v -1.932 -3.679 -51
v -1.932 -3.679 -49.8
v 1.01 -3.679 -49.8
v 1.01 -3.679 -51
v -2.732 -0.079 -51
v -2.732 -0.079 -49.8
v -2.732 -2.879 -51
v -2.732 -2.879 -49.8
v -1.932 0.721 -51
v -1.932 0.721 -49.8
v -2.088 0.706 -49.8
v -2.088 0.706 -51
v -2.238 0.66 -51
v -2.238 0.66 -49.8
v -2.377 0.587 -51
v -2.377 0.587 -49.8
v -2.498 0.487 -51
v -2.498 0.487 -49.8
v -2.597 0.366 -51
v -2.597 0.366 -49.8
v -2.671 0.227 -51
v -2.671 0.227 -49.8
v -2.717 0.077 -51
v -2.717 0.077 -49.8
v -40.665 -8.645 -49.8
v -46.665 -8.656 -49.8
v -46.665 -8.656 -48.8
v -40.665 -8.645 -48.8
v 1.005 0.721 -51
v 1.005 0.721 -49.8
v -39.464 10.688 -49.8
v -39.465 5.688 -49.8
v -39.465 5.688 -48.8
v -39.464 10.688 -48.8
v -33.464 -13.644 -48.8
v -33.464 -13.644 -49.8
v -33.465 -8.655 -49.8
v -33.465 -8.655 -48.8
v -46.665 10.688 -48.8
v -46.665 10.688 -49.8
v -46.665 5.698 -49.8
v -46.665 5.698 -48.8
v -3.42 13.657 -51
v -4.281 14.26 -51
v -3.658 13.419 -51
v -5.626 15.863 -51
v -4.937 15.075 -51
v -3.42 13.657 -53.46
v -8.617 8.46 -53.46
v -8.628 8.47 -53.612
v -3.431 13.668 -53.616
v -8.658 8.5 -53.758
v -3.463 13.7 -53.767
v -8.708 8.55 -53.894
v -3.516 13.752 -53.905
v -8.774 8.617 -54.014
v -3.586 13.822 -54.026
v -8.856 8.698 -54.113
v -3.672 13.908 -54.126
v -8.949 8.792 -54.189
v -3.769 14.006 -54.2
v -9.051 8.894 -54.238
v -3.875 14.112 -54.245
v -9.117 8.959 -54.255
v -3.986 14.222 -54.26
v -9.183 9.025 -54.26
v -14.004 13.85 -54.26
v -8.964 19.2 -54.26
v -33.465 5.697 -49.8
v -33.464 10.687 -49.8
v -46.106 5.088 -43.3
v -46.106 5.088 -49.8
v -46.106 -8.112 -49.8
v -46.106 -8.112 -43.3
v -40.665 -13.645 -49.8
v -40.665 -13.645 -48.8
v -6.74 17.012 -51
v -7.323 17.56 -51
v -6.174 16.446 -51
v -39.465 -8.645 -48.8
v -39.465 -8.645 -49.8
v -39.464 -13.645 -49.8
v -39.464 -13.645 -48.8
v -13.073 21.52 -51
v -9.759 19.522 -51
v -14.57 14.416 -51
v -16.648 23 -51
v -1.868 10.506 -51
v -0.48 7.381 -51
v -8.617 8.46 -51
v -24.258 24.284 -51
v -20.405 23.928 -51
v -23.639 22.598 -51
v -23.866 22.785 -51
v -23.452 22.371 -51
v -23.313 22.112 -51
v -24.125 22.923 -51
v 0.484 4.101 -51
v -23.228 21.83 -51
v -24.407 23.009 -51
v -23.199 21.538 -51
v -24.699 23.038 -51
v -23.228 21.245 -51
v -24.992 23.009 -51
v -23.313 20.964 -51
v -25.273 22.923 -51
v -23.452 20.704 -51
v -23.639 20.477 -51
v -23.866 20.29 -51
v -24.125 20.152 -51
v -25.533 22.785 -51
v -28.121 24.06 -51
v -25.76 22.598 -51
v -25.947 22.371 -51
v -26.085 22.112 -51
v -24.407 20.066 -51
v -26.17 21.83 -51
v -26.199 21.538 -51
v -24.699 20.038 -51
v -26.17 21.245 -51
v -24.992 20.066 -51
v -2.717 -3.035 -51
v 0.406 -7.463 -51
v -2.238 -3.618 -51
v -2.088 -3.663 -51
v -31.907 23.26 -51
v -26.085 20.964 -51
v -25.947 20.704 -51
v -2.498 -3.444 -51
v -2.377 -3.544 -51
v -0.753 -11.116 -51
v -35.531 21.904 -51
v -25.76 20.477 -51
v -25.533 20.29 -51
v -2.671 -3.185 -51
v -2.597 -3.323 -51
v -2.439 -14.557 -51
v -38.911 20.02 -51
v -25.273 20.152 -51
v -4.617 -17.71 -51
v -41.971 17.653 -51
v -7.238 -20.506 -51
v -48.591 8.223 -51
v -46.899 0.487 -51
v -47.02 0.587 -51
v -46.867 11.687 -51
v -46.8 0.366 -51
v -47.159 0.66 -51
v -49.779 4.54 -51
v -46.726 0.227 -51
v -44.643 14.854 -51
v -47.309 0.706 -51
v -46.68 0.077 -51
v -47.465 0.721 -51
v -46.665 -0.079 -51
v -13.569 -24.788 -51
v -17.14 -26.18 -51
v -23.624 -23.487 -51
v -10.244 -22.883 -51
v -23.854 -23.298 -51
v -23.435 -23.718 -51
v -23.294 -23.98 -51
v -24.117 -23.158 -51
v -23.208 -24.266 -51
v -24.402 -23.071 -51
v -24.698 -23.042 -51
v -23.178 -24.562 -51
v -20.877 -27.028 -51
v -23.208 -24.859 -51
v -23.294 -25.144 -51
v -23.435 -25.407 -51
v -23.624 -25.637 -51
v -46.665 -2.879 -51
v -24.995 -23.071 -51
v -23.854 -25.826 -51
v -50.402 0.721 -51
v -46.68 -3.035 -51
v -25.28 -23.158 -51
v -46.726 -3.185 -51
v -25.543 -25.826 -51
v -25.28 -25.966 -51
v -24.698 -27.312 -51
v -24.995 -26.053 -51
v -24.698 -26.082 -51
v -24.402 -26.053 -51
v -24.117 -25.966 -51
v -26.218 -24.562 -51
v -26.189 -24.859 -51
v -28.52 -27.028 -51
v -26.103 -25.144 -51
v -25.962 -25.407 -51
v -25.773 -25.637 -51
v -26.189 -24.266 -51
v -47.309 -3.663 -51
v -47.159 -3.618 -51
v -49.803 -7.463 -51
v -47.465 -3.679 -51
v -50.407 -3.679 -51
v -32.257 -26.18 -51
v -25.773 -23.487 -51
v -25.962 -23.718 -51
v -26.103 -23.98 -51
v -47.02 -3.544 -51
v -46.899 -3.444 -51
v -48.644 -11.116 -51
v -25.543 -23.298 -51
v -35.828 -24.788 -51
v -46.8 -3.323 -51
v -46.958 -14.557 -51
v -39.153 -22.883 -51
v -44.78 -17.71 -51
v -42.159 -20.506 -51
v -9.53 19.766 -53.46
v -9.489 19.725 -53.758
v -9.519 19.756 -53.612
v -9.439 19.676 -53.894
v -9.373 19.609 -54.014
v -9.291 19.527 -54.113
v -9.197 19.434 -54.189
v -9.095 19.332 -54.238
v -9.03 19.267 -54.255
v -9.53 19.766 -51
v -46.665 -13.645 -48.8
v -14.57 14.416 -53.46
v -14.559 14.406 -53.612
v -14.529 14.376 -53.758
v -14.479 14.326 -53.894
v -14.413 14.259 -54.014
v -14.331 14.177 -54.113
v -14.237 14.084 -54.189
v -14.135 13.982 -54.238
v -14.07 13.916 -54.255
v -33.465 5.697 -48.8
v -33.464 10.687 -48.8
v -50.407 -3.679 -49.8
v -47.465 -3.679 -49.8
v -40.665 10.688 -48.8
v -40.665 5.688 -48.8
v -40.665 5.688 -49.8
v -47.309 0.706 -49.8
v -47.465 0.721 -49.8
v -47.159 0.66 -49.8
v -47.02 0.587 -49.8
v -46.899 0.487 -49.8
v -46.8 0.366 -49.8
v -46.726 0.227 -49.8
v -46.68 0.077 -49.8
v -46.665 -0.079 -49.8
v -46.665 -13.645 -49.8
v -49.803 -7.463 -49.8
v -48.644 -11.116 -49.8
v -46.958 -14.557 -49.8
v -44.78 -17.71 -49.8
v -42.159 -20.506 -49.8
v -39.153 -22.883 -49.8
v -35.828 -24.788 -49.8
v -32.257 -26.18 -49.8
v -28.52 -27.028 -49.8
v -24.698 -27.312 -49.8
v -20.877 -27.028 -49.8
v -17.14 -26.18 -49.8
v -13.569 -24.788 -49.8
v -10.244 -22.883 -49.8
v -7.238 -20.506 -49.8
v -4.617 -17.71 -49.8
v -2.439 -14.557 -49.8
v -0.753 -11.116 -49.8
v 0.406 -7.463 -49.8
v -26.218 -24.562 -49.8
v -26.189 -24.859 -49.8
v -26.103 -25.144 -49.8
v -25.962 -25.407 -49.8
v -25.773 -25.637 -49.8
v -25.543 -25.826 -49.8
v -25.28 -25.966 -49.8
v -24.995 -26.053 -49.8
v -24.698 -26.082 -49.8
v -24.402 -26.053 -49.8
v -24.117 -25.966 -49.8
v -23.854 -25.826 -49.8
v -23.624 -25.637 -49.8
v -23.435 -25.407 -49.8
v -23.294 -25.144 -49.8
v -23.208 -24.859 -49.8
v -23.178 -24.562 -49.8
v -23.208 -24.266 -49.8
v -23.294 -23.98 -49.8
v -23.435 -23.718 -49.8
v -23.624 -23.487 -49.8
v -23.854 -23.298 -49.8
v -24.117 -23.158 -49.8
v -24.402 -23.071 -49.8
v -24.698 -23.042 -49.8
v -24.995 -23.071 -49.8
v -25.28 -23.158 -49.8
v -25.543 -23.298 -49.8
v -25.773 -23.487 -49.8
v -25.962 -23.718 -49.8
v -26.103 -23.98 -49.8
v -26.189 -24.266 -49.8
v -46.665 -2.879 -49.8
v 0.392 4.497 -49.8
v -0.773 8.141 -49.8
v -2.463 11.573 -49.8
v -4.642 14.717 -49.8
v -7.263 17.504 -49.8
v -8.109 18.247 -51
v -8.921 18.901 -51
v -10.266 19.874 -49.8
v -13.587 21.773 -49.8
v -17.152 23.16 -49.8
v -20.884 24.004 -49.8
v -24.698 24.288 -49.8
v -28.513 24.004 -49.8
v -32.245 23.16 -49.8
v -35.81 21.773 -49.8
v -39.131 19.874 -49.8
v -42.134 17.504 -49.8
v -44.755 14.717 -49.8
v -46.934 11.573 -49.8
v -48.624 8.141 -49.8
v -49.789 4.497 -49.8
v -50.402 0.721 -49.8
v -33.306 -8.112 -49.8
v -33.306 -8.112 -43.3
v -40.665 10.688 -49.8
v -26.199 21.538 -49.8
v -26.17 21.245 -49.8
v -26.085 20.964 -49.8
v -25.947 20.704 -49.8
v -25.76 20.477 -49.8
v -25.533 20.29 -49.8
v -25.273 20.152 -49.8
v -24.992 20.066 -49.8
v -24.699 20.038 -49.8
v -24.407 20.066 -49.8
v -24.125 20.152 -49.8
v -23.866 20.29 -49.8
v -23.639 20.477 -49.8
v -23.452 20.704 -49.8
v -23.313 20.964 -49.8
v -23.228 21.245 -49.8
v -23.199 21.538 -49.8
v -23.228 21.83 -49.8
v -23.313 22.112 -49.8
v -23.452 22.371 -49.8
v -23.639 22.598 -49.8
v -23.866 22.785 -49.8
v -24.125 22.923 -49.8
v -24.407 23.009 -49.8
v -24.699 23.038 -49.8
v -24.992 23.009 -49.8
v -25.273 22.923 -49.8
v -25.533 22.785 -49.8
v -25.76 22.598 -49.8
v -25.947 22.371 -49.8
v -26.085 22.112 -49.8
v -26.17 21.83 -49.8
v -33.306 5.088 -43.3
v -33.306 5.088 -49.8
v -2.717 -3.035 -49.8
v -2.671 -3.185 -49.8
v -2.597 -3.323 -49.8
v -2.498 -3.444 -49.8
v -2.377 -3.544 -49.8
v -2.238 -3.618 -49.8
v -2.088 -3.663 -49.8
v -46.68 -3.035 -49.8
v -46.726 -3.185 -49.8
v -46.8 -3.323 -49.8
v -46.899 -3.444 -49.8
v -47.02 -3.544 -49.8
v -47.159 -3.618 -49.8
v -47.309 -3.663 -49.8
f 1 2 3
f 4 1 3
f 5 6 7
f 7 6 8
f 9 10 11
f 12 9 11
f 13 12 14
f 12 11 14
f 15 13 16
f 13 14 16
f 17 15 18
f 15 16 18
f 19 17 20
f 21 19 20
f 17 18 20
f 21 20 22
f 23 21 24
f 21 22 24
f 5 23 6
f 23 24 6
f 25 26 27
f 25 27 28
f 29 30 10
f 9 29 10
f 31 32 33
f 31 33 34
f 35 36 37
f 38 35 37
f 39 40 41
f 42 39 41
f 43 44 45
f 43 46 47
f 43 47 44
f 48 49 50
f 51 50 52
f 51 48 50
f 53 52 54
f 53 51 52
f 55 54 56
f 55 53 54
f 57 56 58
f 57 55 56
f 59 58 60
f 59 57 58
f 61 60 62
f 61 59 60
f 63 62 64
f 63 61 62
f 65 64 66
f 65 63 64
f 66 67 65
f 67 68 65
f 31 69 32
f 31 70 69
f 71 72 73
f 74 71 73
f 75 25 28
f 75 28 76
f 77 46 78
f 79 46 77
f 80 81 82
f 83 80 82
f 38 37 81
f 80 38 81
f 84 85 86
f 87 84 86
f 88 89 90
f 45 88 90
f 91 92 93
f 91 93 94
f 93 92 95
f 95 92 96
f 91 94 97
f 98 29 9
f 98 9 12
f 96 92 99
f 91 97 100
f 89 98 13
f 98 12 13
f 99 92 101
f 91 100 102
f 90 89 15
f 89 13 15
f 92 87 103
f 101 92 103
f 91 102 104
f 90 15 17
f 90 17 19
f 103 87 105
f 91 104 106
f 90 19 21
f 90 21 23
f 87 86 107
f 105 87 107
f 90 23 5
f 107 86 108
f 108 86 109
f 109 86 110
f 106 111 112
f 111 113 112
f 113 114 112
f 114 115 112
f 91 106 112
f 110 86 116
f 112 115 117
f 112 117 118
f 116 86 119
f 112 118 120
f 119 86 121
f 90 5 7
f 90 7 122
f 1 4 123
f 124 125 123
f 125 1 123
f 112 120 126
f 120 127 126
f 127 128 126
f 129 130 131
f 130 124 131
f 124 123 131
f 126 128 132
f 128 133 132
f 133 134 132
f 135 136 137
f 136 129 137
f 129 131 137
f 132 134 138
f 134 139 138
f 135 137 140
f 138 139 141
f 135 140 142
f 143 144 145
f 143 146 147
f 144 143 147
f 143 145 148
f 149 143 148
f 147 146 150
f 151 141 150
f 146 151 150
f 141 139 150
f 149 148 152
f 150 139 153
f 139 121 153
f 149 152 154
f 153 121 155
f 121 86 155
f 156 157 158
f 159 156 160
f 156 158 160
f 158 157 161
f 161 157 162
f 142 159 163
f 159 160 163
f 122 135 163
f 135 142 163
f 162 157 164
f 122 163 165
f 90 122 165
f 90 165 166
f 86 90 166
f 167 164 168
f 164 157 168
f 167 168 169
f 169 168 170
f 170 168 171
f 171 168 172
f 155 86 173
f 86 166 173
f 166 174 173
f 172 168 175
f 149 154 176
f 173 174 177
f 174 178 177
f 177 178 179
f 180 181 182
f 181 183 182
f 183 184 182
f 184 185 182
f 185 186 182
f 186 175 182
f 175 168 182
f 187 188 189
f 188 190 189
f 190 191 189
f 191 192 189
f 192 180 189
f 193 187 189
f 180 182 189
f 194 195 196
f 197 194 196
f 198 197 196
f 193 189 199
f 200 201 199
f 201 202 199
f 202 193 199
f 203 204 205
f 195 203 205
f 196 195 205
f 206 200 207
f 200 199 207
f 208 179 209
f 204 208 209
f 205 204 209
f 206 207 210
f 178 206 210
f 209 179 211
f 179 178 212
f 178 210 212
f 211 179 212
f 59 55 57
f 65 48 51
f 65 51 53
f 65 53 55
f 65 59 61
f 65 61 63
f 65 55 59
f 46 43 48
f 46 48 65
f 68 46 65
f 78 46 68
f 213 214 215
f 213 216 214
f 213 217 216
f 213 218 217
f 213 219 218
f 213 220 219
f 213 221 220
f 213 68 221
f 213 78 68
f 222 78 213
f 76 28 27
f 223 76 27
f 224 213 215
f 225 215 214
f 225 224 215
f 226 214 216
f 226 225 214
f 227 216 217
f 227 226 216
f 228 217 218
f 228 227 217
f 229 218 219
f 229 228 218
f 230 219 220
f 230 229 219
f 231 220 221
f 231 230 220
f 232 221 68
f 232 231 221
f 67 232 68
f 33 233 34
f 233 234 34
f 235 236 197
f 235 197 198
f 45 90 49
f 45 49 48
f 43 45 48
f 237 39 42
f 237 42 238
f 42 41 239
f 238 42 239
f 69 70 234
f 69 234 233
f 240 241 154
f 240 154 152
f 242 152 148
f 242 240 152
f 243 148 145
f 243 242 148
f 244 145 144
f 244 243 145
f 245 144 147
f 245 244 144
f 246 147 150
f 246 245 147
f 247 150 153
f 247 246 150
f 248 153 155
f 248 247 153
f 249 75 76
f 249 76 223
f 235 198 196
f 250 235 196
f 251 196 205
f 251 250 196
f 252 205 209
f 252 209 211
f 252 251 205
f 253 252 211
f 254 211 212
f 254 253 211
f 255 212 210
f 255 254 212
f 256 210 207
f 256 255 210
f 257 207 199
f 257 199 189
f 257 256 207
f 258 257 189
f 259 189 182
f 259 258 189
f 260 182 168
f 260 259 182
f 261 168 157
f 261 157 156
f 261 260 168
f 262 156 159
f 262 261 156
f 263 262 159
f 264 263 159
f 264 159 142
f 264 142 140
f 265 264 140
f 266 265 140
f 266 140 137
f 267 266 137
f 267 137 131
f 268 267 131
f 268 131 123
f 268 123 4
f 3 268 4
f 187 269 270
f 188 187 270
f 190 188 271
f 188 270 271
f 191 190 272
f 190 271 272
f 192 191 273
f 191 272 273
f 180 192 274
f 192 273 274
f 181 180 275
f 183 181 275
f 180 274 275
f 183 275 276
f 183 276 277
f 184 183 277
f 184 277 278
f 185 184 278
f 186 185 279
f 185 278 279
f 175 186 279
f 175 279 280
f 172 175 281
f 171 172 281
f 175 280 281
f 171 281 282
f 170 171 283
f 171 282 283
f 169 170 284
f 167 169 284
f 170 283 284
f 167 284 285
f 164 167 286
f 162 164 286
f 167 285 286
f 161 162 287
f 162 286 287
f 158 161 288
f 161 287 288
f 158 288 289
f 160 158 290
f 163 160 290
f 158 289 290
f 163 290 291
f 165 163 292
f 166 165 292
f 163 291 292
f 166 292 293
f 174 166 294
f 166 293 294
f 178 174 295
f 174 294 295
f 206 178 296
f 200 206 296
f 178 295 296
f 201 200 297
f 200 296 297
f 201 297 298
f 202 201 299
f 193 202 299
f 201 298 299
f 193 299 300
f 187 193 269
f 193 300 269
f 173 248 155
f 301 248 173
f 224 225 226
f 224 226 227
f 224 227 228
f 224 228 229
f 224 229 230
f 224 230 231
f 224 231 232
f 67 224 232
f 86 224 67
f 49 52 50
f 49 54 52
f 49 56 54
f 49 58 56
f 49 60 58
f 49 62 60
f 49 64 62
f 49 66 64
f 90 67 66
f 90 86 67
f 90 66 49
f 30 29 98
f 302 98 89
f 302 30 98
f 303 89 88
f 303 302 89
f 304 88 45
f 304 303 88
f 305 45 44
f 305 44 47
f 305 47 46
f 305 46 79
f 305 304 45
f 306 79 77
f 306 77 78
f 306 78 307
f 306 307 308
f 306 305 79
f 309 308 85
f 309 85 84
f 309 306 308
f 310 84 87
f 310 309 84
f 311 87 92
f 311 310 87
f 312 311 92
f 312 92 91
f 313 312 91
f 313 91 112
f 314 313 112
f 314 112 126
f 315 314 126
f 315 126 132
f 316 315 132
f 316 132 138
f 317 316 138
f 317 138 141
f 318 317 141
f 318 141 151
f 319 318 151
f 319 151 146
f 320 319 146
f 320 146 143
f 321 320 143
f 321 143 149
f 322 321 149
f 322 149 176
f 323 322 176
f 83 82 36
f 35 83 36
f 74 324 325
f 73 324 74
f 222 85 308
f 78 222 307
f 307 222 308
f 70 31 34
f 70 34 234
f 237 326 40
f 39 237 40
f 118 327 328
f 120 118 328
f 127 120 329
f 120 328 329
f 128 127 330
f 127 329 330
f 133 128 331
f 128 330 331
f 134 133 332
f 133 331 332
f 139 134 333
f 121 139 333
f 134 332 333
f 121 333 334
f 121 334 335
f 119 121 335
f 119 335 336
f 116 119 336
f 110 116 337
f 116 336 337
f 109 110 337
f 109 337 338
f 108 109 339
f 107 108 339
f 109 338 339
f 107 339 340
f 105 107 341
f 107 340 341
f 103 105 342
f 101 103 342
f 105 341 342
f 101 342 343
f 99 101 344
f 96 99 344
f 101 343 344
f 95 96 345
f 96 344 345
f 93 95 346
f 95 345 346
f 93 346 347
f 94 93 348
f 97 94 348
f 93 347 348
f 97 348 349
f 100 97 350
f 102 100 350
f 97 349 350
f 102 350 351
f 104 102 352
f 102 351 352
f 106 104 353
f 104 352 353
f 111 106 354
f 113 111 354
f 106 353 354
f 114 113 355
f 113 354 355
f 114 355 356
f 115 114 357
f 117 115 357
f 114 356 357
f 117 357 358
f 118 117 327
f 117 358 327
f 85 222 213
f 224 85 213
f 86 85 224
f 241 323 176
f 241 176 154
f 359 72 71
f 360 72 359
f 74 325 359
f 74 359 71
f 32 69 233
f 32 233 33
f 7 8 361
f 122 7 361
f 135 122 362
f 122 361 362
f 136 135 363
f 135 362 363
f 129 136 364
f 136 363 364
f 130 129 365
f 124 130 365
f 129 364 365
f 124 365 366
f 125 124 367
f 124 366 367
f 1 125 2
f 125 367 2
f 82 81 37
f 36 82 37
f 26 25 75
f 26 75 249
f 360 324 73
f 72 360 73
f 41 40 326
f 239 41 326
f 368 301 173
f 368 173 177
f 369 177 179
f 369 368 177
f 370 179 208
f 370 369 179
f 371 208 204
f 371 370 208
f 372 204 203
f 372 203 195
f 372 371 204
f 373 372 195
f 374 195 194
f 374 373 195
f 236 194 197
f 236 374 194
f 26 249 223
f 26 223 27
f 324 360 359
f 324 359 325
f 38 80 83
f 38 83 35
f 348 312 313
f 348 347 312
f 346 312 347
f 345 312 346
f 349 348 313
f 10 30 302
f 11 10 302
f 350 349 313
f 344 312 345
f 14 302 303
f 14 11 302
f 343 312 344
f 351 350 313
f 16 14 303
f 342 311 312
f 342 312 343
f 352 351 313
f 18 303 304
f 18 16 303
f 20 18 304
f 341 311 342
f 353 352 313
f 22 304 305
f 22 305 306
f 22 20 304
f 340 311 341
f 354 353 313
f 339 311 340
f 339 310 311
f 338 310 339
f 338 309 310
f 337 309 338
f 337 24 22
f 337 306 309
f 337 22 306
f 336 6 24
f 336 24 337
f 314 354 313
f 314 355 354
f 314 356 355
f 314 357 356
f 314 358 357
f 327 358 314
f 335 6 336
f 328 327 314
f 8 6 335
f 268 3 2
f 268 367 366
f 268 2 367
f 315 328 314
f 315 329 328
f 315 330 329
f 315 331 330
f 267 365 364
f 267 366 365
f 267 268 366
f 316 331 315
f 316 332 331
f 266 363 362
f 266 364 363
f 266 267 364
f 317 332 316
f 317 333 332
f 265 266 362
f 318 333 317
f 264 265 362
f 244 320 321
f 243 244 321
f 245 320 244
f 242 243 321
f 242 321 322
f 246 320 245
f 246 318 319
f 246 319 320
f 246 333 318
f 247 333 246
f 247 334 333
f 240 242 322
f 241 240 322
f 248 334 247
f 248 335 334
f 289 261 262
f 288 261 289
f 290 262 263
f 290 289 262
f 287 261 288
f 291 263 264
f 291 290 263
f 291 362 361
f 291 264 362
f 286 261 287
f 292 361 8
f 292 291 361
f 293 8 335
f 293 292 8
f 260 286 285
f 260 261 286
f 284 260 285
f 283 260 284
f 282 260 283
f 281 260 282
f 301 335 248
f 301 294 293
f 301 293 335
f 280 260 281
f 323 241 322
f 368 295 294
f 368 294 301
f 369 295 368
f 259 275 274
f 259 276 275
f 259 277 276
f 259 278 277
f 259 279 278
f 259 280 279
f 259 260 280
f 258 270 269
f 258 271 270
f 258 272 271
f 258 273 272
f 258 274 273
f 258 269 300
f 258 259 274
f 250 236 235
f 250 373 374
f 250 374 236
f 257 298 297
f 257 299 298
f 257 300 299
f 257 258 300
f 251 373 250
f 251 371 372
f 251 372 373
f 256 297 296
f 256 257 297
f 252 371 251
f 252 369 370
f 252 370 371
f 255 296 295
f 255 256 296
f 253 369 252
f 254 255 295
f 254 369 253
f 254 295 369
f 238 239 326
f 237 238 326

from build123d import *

# Parameters (mm, degrees)
EXTRUDE_START       = -49.800416
SKETCH_2_R          = 25.8
SKETCH_2_R_2        = 1.49999954
SKETCH_2_R_3        = 1.52
EXTRUDE_1_DEPTH     = 1.2
EXTRUDE_2_DEPTH     = 6.5
EXTRUDE_3_DEPTH     = 1
EXTRUDE_3_2_DEPTH   = 1
EXTRUDE_3_3_DEPTH   = 1
EXTRUDE_3_4_DEPTH   = 1
CUT_EXTRUDE_START   = -49.800416
CUT_EXTRUDE_2_DEPTH = 1.2
EXTRUDE_START_2     = -51.000416
EXTRUDE_4_DEPTH     = 3.26
FILLET_1_R          = 0.8


with BuildPart() as part:
    # 草图2 → 凸台-拉伸1 (new body)
    with BuildSketch(Plane.XY.offset(EXTRUDE_START)):
        with Locations(Location((-24.698490112, -1.512152456, 0), (0, 0, 180))):
            Circle(SKETCH_2_R)
        with Locations(Location((-24.699302249, 21.537658542, 0), (0, 0, 180))):
            Circle(SKETCH_2_R_2, mode=Mode.SUBTRACT)
        with Locations(Location((-24.698490112, -24.562152076, 0), (0, 0, 180))):
            Circle(SKETCH_2_R_3, mode=Mode.SUBTRACT)
    extrude(amount=-EXTRUDE_1_DEPTH)

    # 草图5 → 切除-拉伸2 (cut)
    with BuildSketch(Plane.XY.offset(CUT_EXTRUDE_START)):
        with BuildLine():
            Line((-46.664936261, -0.078657487), (-46.664936261, -2.878657487))
            ThreePointArc((-46.664936261, -2.878657487), (-46.899250836, -3.444342912), (-47.464936261, -3.678657487))
            Line((-47.464936261, -3.678657487), (-57.601175162, -3.678657487))
            Line((-57.601175162, -3.678657487), (-57.601175162, -1.478657487))
            Line((-57.601175162, -1.478657487), (-57.601175162, 0.721342513))
            Line((-57.601175162, 0.721342513), (-47.464936261, 0.721342513))
            ThreePointArc((-47.464936261, 0.721342513), (-46.899250836, 0.487027938), (-46.664936261, -0.078657487))
        make_face()
        with BuildLine():
            Line((-1.932043962, -3.678657487), (8.204194939, -3.678657487))
            Line((8.204194939, -3.678657487), (8.204194939, -1.478657487))
            Line((8.204194939, -1.478657487), (8.204194939, 0.721342513))
            Line((8.204194939, 0.721342513), (-1.932043962, 0.721342513))
            ThreePointArc((-1.932043962, 0.721342513), (-2.497729387, 0.487027938), (-2.732043962, -0.078657487))
            Line((-2.732043962, -0.078657487), (-2.732043962, -2.878657487))
            ThreePointArc((-2.732043962, -2.878657487), (-2.497729387, -3.444342912), (-1.932043962, -3.678657487))
        make_face()
    extrude(amount=-CUT_EXTRUDE_2_DEPTH, mode=Mode.SUBTRACT)

    # 草图6 → 凸台-拉伸4 (add)
    with BuildSketch(Plane.XY.offset(EXTRUDE_START_2)):
        Polygon((-14.569549448, 14.416291987), (-8.617406593, 8.459528473), (-3.420171752, 13.656763315), (-9.529574341, 19.766165904), align=None)
    extrude(amount=-EXTRUDE_4_DEPTH)

    # 圆角1
    fillet_1_edges = [part.edges().sort_by_distance(p)[0] for p in [
        (-12.049561894, 17.091228946, -54.260416),
        (-6.018789173, 11.058145894, -54.260416),
    ]]
    fillet(fillet_1_edges, radius=FILLET_1_R)


with BuildPart() as body_2:
    # 草图3 → 凸台-拉伸2 (new body)
    with BuildSketch(Plane.XY.offset(EXTRUDE_START)):
        Polygon((-46.106203951, -1.512152456), (-46.106203951, 5.087847544), (-33.306203951, 5.087847544), (-33.306203951, -8.112152456), (-46.106203951, -8.112152456), align=None)
    extrude(amount=EXTRUDE_2_DEPTH)


with BuildPart() as body_3:
    # 草图4 → 凸台-拉伸3 (new body)
    with BuildSketch(Plane.XY.offset(EXTRUDE_START)):
        Polygon((-39.464936268, -8.64507071), (-39.464171207, -13.645070651), (-33.464171277, -13.644152578), (-33.464934728, -8.654677262), align=None)
    extrude(amount=EXTRUDE_3_DEPTH)


with BuildPart() as body_4:
    # 草图4 → Extrude 3 2 (new body)
    with BuildSketch(Plane.XY.offset(EXTRUDE_START)):
        Polygon((-33.464934728, 5.697362288), (-39.464936268, 5.687755735), (-39.464171207, 10.687755677), (-33.464171277, 10.686837604), align=None)
    extrude(amount=EXTRUDE_3_2_DEPTH)


with BuildPart() as body_5:
    # 草图4 → Extrude 3 3 (new body)
    with BuildSketch(Plane.XY.offset(EXTRUDE_START)):
        Polygon((-40.664936261, 5.687847542), (-40.664936261, 10.687847542), (-46.664936261, 10.687847542), (-46.664936261, 5.698372168), align=None)
    extrude(amount=EXTRUDE_3_3_DEPTH)


with BuildPart() as body_6:
    # 草图4 → Extrude 3 4 (new body)
    with BuildSketch(Plane.XY.offset(EXTRUDE_START)):
        Polygon((-46.664936261, -8.655687143), (-40.664936261, -8.645162517), (-40.664936261, -13.645162517), (-46.664936261, -13.645162517), align=None)
    extrude(amount=EXTRUDE_3_4_DEPTH)


solid = Compound([part.part, body_2.part, body_3.part, body_4.part, body_5.part, body_6.part])
